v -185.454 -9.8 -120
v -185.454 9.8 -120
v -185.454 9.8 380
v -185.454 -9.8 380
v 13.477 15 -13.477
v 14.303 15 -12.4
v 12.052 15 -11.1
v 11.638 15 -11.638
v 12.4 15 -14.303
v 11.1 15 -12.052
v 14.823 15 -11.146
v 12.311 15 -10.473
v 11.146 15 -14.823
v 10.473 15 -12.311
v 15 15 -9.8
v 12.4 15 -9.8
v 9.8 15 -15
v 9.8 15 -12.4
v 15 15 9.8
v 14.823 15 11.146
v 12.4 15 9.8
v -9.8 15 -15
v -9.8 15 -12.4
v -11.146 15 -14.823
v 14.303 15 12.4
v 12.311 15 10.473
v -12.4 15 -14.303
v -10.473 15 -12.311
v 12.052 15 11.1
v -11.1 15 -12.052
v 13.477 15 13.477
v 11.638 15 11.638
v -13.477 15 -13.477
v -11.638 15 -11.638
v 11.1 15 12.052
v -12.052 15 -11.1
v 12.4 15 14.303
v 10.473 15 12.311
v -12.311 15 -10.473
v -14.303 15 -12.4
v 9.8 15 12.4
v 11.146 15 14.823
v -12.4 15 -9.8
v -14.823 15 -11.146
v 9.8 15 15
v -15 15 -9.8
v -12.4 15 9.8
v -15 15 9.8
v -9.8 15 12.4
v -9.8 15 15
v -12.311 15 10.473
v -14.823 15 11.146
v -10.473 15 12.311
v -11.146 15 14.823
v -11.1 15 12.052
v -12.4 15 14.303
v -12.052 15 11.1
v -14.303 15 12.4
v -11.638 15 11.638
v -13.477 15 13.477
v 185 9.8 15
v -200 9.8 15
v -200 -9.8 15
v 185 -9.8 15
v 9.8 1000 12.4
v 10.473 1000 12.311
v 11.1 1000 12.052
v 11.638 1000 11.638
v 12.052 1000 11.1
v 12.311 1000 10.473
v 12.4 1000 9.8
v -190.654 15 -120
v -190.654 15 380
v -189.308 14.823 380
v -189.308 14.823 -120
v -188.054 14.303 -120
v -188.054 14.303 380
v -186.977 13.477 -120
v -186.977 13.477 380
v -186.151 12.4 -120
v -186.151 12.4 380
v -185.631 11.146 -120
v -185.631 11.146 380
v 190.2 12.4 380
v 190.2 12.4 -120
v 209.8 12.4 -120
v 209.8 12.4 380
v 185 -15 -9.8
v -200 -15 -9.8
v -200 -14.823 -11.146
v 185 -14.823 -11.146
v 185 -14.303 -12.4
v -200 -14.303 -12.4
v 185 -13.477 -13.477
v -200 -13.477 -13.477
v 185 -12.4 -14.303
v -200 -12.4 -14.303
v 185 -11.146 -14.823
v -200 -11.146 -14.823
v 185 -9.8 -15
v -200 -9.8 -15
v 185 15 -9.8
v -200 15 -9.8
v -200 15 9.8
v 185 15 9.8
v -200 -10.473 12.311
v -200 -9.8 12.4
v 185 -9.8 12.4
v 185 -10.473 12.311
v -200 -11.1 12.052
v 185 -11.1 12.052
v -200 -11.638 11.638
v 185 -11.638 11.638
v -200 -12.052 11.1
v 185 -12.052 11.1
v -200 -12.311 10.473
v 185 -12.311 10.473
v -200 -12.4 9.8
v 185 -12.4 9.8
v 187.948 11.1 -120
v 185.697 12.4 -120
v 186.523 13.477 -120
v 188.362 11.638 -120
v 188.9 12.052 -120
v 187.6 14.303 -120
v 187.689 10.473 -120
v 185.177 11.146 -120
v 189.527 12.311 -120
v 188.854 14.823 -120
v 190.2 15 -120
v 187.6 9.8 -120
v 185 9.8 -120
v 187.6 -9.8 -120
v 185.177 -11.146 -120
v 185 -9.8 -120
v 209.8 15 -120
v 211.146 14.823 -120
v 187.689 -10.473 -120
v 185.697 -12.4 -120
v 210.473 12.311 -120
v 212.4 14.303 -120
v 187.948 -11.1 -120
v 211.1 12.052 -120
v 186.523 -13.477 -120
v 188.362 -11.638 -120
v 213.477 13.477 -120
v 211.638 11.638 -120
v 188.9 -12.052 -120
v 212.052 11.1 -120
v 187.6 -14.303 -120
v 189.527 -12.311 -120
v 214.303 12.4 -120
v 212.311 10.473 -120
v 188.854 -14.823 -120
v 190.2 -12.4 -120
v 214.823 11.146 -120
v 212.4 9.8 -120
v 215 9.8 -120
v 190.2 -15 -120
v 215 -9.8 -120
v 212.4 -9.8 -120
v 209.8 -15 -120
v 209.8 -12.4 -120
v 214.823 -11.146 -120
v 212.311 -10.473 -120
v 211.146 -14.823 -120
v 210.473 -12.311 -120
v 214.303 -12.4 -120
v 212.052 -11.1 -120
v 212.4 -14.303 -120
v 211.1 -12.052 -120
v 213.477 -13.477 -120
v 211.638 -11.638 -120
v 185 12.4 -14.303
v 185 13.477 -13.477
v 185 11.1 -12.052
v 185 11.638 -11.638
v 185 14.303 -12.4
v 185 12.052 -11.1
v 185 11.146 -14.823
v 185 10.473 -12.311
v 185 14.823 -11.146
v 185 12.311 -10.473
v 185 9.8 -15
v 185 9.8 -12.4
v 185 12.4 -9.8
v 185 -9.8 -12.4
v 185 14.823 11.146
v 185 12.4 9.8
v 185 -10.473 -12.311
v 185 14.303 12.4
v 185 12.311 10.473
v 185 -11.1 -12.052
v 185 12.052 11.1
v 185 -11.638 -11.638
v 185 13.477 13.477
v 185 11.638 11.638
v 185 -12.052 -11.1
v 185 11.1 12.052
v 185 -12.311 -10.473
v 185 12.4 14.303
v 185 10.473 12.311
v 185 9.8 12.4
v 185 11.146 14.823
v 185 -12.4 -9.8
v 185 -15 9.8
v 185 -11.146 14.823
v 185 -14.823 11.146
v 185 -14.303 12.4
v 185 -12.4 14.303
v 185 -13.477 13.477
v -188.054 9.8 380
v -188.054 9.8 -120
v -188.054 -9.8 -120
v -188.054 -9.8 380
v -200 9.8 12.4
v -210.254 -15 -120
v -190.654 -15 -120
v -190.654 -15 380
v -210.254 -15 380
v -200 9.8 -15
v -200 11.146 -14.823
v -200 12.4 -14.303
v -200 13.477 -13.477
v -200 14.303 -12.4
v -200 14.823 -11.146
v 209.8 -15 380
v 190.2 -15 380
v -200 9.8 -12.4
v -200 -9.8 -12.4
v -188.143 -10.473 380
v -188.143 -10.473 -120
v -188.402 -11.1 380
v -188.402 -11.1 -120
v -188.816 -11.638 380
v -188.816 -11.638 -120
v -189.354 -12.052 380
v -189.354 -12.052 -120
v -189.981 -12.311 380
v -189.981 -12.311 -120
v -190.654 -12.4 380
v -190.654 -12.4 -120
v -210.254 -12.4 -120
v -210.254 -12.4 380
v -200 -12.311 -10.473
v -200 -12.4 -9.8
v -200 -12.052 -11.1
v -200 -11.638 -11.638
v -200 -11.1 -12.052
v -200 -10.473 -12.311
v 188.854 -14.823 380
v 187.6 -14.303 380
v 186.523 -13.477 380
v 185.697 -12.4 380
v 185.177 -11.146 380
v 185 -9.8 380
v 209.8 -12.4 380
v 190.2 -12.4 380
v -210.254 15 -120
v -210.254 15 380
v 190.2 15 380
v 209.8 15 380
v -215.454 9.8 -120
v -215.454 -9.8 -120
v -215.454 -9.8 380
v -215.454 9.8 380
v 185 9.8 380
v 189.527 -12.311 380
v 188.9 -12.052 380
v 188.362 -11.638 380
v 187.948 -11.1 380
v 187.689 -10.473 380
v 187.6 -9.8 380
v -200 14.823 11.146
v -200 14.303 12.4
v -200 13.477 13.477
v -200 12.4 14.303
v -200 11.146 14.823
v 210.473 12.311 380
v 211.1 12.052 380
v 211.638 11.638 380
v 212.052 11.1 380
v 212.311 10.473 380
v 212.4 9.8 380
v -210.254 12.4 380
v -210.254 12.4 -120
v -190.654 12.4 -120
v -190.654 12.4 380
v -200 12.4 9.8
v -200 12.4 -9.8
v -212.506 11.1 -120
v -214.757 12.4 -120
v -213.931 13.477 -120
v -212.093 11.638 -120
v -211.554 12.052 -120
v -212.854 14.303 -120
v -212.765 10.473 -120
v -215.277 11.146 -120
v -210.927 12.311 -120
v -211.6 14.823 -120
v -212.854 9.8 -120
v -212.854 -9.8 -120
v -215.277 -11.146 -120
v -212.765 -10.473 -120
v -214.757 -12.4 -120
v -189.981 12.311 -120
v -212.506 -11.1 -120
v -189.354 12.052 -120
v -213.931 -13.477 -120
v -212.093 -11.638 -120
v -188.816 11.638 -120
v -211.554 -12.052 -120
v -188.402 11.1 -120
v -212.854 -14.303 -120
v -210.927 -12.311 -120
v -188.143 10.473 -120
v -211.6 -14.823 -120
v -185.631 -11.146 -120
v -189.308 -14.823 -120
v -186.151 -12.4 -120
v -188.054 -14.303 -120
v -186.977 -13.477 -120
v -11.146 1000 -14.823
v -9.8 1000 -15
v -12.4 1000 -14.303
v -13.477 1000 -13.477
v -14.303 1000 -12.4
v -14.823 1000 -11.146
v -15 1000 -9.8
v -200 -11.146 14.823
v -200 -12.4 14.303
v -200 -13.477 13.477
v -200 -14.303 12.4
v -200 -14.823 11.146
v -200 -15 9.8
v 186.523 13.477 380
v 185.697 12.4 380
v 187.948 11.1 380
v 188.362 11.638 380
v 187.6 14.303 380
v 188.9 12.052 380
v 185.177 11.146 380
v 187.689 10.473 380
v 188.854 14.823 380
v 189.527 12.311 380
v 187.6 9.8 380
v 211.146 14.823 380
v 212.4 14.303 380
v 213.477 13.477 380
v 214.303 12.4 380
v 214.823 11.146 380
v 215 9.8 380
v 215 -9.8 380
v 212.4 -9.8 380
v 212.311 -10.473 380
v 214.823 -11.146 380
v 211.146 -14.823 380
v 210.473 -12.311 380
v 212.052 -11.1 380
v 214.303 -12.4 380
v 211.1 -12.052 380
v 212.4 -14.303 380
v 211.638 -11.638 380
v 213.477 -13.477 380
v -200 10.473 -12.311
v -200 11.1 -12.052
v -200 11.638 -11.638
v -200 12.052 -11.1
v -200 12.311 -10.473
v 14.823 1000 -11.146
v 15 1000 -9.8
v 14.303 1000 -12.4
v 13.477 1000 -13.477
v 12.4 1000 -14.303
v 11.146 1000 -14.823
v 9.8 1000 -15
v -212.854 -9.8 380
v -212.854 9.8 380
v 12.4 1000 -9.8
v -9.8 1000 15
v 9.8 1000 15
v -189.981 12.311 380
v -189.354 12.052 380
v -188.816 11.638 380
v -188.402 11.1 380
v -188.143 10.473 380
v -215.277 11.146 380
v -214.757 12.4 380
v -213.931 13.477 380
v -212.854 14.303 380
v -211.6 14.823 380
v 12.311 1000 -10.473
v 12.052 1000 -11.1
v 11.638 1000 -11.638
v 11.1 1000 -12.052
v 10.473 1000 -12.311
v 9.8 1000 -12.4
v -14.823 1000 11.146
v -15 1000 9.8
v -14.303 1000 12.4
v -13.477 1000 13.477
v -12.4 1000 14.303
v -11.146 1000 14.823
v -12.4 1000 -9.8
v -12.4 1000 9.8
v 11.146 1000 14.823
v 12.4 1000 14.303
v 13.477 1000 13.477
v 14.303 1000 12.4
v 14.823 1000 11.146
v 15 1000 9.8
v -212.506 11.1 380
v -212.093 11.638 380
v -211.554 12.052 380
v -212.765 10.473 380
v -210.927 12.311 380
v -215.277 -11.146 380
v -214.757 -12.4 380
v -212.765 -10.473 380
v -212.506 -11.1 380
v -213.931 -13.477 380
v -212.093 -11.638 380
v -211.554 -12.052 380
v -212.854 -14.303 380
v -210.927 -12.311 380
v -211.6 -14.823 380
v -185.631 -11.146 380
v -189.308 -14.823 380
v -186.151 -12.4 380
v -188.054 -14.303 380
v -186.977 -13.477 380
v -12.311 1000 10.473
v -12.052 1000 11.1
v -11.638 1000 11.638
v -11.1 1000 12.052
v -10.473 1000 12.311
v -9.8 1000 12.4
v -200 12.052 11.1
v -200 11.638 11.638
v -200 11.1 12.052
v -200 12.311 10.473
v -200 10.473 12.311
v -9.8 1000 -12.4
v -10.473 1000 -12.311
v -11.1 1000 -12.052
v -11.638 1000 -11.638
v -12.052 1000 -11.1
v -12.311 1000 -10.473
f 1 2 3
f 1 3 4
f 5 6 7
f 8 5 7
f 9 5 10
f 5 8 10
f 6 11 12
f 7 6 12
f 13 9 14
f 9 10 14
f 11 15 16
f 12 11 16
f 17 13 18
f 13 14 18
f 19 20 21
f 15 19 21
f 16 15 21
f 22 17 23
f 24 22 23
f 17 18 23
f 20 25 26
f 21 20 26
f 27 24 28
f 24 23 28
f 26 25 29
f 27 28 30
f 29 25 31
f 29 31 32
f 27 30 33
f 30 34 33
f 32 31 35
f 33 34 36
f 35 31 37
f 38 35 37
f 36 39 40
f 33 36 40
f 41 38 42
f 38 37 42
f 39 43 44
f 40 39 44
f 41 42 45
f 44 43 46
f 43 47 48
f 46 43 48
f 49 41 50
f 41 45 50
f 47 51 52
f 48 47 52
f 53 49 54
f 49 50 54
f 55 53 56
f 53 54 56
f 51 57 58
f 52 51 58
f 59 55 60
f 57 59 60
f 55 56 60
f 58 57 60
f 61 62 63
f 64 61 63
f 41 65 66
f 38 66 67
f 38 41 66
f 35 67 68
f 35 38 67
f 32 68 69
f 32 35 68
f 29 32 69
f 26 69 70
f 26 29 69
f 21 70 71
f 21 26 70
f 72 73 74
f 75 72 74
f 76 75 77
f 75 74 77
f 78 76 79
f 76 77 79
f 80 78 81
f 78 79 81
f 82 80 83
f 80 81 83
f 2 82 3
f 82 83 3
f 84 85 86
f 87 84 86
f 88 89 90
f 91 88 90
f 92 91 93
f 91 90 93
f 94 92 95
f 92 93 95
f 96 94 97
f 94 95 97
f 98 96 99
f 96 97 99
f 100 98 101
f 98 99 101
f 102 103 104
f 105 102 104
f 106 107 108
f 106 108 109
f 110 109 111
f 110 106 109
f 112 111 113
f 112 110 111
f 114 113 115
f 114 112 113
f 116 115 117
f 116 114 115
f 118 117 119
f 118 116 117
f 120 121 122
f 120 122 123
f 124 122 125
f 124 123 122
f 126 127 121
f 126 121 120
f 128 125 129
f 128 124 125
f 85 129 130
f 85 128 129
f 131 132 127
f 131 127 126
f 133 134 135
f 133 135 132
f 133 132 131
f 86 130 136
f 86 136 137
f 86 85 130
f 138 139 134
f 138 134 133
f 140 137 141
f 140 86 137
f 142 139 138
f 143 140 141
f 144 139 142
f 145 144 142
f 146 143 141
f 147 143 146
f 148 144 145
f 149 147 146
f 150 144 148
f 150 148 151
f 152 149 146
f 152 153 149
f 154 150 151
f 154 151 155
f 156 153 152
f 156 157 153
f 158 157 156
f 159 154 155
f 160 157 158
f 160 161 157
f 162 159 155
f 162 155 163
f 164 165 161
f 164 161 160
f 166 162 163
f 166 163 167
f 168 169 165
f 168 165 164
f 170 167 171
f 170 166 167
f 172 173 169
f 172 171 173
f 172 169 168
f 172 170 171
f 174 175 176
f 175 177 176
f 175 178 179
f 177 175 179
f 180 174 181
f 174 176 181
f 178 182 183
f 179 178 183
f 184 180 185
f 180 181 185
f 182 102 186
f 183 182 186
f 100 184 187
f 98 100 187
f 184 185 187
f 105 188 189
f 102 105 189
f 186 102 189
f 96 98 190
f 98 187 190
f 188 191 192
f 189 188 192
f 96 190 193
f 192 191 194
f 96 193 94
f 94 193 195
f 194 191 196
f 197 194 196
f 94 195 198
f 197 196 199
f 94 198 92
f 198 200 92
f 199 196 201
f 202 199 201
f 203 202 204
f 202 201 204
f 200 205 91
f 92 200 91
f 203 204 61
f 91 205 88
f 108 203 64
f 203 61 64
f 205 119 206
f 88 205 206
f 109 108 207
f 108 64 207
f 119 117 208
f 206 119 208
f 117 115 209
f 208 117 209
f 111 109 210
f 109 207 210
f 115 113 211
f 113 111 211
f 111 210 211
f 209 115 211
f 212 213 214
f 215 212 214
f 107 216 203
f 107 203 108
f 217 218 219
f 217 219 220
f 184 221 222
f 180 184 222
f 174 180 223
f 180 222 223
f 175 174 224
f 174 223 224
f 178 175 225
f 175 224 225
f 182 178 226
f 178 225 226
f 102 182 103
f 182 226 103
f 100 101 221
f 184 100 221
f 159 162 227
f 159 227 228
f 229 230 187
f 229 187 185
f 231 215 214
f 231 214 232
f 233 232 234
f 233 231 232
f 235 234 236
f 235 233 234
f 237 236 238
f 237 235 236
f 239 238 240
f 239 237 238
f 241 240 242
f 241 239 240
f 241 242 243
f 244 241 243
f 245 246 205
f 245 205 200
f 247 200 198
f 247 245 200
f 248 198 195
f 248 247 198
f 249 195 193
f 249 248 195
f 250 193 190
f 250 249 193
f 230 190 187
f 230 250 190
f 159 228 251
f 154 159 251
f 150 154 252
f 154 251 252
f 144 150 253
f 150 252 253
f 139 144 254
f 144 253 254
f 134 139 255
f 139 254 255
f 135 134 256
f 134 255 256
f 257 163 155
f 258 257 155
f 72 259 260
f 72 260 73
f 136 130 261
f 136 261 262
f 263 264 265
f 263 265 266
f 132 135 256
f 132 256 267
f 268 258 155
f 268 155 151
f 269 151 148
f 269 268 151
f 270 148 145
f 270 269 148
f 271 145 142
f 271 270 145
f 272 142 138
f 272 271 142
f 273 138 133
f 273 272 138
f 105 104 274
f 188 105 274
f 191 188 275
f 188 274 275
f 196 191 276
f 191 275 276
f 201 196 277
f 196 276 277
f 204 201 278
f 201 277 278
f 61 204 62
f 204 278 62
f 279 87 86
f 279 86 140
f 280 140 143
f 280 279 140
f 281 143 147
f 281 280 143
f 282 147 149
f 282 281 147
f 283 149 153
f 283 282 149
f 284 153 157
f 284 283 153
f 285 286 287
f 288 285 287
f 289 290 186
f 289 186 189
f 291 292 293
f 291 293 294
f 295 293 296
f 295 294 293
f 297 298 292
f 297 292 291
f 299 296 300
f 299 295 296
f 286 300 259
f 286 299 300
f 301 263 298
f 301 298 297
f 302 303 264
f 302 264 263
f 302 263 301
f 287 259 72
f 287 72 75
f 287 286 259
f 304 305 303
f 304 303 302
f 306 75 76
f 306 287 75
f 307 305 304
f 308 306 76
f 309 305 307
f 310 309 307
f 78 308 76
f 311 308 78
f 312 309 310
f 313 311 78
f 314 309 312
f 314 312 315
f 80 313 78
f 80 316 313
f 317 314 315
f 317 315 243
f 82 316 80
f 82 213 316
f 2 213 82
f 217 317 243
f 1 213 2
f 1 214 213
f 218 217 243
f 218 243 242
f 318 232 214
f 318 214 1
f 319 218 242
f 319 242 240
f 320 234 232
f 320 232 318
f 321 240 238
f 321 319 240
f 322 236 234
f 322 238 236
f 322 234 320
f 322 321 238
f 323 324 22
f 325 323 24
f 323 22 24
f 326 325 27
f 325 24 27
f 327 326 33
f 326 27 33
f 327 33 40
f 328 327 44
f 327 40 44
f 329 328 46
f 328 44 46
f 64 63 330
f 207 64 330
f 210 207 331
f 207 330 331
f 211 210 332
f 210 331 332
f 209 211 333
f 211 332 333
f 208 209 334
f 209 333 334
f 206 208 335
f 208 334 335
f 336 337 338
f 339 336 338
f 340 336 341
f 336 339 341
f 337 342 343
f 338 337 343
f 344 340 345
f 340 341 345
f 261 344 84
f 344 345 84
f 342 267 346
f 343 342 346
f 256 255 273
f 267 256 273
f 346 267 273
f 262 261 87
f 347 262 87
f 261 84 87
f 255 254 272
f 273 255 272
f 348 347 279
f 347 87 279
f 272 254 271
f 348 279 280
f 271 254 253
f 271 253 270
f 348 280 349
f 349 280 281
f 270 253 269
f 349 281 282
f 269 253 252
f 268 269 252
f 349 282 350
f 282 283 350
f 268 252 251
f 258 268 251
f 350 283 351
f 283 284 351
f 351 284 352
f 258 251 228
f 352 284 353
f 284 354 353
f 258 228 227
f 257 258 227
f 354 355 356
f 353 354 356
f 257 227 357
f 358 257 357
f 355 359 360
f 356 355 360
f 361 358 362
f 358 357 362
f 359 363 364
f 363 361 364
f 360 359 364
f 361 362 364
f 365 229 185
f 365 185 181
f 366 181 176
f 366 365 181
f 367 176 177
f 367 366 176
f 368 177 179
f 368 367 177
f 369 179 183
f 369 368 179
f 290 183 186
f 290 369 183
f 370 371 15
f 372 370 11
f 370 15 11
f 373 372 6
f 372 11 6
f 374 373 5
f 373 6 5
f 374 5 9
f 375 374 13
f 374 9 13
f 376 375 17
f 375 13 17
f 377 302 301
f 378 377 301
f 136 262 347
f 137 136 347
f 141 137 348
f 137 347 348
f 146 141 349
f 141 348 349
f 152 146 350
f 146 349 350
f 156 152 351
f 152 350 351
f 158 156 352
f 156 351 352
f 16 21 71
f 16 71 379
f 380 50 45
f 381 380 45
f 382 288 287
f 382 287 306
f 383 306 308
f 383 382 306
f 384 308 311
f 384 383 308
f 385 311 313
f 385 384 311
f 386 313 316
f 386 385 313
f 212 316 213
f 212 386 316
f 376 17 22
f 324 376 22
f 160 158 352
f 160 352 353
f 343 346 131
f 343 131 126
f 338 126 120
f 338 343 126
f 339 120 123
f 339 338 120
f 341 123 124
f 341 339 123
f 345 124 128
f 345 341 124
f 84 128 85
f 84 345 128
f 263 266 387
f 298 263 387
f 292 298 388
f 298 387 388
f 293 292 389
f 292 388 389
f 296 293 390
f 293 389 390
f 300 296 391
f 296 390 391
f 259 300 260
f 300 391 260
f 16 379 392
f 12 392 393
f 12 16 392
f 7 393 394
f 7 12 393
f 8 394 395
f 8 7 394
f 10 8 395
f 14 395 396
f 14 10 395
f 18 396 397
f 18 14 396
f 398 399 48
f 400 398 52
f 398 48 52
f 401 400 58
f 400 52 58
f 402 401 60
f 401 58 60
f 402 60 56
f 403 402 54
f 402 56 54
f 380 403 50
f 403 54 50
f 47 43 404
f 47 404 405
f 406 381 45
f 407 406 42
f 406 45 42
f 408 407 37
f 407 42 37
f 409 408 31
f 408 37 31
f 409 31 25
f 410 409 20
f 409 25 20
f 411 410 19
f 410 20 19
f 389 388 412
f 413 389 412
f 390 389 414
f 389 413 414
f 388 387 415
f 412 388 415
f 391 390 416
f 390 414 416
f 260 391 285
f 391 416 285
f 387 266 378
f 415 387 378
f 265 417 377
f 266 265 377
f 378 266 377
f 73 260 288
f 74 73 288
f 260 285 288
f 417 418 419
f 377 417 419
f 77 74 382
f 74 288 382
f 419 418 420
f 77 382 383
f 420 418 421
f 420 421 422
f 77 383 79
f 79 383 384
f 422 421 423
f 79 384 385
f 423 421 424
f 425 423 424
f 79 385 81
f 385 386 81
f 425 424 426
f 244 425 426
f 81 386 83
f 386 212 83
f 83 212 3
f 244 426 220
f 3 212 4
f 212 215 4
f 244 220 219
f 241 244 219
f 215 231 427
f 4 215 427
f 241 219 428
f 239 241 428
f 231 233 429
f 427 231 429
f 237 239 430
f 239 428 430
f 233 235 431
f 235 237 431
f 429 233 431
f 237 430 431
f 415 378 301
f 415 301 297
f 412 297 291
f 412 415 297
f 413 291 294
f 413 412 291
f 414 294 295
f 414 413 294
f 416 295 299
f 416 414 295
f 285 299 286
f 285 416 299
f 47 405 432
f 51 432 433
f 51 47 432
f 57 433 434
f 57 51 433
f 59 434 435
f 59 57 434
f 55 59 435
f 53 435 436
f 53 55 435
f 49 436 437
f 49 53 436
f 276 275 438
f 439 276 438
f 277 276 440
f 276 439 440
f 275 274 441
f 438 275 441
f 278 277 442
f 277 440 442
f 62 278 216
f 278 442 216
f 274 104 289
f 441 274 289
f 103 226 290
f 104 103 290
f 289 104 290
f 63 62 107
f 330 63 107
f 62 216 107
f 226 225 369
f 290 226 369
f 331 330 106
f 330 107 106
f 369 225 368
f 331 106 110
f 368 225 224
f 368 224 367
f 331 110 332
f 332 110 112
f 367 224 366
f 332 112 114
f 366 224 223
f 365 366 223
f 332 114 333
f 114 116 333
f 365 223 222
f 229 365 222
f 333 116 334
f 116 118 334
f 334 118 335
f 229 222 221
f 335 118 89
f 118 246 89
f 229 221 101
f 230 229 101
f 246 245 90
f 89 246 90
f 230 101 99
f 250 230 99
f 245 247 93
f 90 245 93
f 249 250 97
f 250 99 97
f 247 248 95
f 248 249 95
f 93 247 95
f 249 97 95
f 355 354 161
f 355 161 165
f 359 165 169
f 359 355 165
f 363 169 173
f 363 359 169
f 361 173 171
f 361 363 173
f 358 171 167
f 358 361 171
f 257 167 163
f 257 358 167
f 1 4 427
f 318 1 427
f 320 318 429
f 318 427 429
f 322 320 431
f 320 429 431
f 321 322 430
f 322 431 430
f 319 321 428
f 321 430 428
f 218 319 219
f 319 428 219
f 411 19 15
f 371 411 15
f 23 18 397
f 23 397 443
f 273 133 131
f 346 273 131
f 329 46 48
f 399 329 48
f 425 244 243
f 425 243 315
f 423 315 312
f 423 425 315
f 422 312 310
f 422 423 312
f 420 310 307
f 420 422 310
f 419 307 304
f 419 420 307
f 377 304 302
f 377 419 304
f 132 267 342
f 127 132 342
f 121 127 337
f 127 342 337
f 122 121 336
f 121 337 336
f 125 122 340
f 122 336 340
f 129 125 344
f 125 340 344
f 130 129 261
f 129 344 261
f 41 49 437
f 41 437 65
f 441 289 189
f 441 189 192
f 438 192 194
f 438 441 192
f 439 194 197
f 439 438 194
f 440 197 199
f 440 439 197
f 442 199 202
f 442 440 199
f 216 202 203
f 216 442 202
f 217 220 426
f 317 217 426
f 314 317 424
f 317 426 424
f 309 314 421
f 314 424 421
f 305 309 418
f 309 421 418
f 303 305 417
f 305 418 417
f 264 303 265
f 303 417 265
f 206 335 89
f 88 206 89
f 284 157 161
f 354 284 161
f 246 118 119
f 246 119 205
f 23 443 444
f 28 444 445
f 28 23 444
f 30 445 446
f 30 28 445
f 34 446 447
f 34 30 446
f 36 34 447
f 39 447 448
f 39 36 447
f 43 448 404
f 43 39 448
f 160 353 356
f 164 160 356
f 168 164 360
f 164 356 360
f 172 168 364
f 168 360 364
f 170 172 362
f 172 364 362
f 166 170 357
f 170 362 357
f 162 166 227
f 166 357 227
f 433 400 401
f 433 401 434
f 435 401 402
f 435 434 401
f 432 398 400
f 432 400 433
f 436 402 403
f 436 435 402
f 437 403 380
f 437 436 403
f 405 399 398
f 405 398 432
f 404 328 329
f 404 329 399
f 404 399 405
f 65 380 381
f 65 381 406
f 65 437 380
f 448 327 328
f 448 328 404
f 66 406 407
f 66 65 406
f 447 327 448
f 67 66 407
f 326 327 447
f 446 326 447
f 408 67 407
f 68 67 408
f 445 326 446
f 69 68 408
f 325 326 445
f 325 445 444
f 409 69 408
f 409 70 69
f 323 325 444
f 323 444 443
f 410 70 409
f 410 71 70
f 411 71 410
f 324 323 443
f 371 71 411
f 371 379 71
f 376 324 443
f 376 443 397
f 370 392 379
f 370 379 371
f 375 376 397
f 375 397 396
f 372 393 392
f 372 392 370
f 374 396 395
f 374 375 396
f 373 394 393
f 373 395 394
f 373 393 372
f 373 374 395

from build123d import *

# Parameters (mm, degrees)
COMPONENTE_ESTRUTURAL1_DEPTH      = 1000
COMPONENTE_ESTRUTURAL1_DEPTH_BACK = 1
COMPONENTE_ESTRUTURAL1_2_DEPTH    = 401
COMPONENTE_ESTRUTURAL1_3_DEPTH    = 500
COMPONENTE_ESTRUTURAL1_4_DEPTH    = 500


with BuildPart() as part:
    # Sketch1 → Componente estrutural1 (new, two sides: drawn at the far end of the back side and taken through both)
    with BuildSketch(Plane(origin=(0, 0, 0), x_dir=(1, 0, 0), z_dir=(0, 1, 0)).offset(-COMPONENTE_ESTRUTURAL1_DEPTH_BACK)):
        with BuildLine():
            Line((-9.8, -15), (9.8, -15))
            ThreePointArc((9.8, -15), (13.476955262, -13.476955262), (15, -9.8))
            Line((15, -9.8), (15, 9.8))
            ThreePointArc((15, 9.8), (13.476955262, 13.476955262), (9.8, 15))
            Line((9.8, 15), (-9.8, 15))
            ThreePointArc((-9.8, 15), (-13.476955262, 13.476955262), (-15, 9.8))
            Line((-15, 9.8), (-15, -9.8))
            ThreePointArc((-15, -9.8), (-13.476955262, -13.476955262), (-9.8, -15))
        make_face()
        with BuildLine():
            Line((-9.8, -12.4), (9.8, -12.4))
            ThreePointArc((9.8, -12.4), (11.638477631, -11.638477631), (12.4, -9.8))
            Line((12.4, -9.8), (12.4, 9.8))
            ThreePointArc((12.4, 9.8), (11.638477631, 11.638477631), (9.8, 12.4))
            Line((9.8, 12.4), (-9.8, 12.4))
            ThreePointArc((-9.8, 12.4), (-11.638477631, 11.638477631), (-12.4, 9.8))
            Line((-12.4, 9.8), (-12.4, -9.8))
            ThreePointArc((-12.4, -9.8), (-11.638477631, -11.638477631), (-9.8, -12.4))
        make_face(mode=Mode.SUBTRACT)
    extrude(amount=COMPONENTE_ESTRUTURAL1_DEPTH + COMPONENTE_ESTRUTURAL1_DEPTH_BACK)

    # Componente estrutural1 end butt 1
    split(bisect_by=Plane(origin=(0, 15, 0), x_dir=(-1, 0, 0), z_dir=(0, 1, 0)), keep=Keep.TOP)


with BuildPart() as body_2:
    # Sketch1 on segment 2 (carried to segment 2) → Componente estrutural1 2 (new body)
    with BuildSketch(Plane(origin=(-200, 0, 0), x_dir=(0, -1, 0), z_dir=(1, 0, 0))):
        with BuildLine():
            Line((-9.8, -15), (9.8, -15))
            ThreePointArc((9.8, -15), (13.476955262, -13.476955262), (15, -9.8))
            Line((15, -9.8), (15, 9.8))
            ThreePointArc((15, 9.8), (13.476955262, 13.476955262), (9.8, 15))
            Line((9.8, 15), (-9.8, 15))
            ThreePointArc((-9.8, 15), (-13.476955262, 13.476955262), (-15, 9.8))
            Line((-15, 9.8), (-15, -9.8))
            ThreePointArc((-15, -9.8), (-13.476955262, -13.476955262), (-9.8, -15))
        make_face()
        with BuildLine():
            Line((-9.8, -12.4), (9.8, -12.4))
            ThreePointArc((9.8, -12.4), (11.638477631, -11.638477631), (12.4, -9.8))
            Line((12.4, -9.8), (12.4, 9.8))
            ThreePointArc((12.4, 9.8), (11.638477631, 11.638477631), (9.8, 12.4))
            Line((9.8, 12.4), (-9.8, 12.4))
            ThreePointArc((-9.8, 12.4), (-11.638477631, 11.638477631), (-12.4, 9.8))
            Line((-12.4, 9.8), (-12.4, -9.8))
            ThreePointArc((-12.4, -9.8), (-11.638477631, -11.638477631), (-9.8, -12.4))
        make_face(mode=Mode.SUBTRACT)
    extrude(amount=COMPONENTE_ESTRUTURAL1_2_DEPTH)

    # Componente estrutural1 2 end butt 1
    split(bisect_by=Plane(origin=(185, 0, 0), x_dir=(0, -1, 0), z_dir=(-1, 0, 0)), keep=Keep.TOP)


with BuildPart() as body_3:
    # Sketch1 on segment 3 (carried to segment 3) → Componente estrutural1 3 (new body)
    with BuildSketch(Plane(origin=(200, 0, 380), x_dir=(1, 0, 0), z_dir=(0, 0, -1))):
        with BuildLine():
            Line((-9.8, -15), (9.8, -15))
            ThreePointArc((9.8, -15), (13.476955262, -13.476955262), (15, -9.8))
            Line((15, -9.8), (15, 9.8))
            ThreePointArc((15, 9.8), (13.476955262, 13.476955262), (9.8, 15))
            Line((9.8, 15), (-9.8, 15))
            ThreePointArc((-9.8, 15), (-13.476955262, 13.476955262), (-15, 9.8))
            Line((-15, 9.8), (-15, -9.8))
            ThreePointArc((-15, -9.8), (-13.476955262, -13.476955262), (-9.8, -15))
        make_face()
        with BuildLine():
            Line((-9.8, -12.4), (9.8, -12.4))
            ThreePointArc((9.8, -12.4), (11.638477631, -11.638477631), (12.4, -9.8))
            Line((12.4, -9.8), (12.4, 9.8))
            ThreePointArc((12.4, 9.8), (11.638477631, 11.638477631), (9.8, 12.4))
            Line((9.8, 12.4), (-9.8, 12.4))
            ThreePointArc((-9.8, 12.4), (-11.638477631, 11.638477631), (-12.4, 9.8))
            Line((-12.4, 9.8), (-12.4, -9.8))
            ThreePointArc((-12.4, -9.8), (-11.638477631, -11.638477631), (-9.8, -12.4))
        make_face(mode=Mode.SUBTRACT)
    extrude(amount=COMPONENTE_ESTRUTURAL1_3_DEPTH)


with BuildPart() as body_4:
    # Sketch1 on segment 4 (carried to segment 4) → Componente estrutural1 4 (new body)
    with BuildSketch(Plane(origin=(-200.454048056, 0, 380), x_dir=(1, 0, 0), z_dir=(0, 0, -1))):
        with BuildLine():
            Line((-9.8, -15), (9.8, -15))
            ThreePointArc((9.8, -15), (13.476955262, -13.476955262), (15, -9.8))
            Line((15, -9.8), (15, 9.8))
            ThreePointArc((15, 9.8), (13.476955262, 13.476955262), (9.8, 15))
            Line((9.8, 15), (-9.8, 15))
            ThreePointArc((-9.8, 15), (-13.476955262, 13.476955262), (-15, 9.8))
            Line((-15, 9.8), (-15, -9.8))
            ThreePointArc((-15, -9.8), (-13.476955262, -13.476955262), (-9.8, -15))
        make_face()
        with BuildLine():
            Line((-9.8, -12.4), (9.8, -12.4))
            ThreePointArc((9.8, -12.4), (11.638477631, -11.638477631), (12.4, -9.8))
            Line((12.4, -9.8), (12.4, 9.8))
            ThreePointArc((12.4, 9.8), (11.638477631, 11.638477631), (9.8, 12.4))
            Line((9.8, 12.4), (-9.8, 12.4))
            ThreePointArc((-9.8, 12.4), (-11.638477631, 11.638477631), (-12.4, 9.8))
            Line((-12.4, 9.8), (-12.4, -9.8))
            ThreePointArc((-12.4, -9.8), (-11.638477631, -11.638477631), (-9.8, -12.4))
        make_face(mode=Mode.SUBTRACT)
    extrude(amount=COMPONENTE_ESTRUTURAL1_4_DEPTH)


solid = Compound([part.part, body_2.part, body_3.part, body_4.part])
